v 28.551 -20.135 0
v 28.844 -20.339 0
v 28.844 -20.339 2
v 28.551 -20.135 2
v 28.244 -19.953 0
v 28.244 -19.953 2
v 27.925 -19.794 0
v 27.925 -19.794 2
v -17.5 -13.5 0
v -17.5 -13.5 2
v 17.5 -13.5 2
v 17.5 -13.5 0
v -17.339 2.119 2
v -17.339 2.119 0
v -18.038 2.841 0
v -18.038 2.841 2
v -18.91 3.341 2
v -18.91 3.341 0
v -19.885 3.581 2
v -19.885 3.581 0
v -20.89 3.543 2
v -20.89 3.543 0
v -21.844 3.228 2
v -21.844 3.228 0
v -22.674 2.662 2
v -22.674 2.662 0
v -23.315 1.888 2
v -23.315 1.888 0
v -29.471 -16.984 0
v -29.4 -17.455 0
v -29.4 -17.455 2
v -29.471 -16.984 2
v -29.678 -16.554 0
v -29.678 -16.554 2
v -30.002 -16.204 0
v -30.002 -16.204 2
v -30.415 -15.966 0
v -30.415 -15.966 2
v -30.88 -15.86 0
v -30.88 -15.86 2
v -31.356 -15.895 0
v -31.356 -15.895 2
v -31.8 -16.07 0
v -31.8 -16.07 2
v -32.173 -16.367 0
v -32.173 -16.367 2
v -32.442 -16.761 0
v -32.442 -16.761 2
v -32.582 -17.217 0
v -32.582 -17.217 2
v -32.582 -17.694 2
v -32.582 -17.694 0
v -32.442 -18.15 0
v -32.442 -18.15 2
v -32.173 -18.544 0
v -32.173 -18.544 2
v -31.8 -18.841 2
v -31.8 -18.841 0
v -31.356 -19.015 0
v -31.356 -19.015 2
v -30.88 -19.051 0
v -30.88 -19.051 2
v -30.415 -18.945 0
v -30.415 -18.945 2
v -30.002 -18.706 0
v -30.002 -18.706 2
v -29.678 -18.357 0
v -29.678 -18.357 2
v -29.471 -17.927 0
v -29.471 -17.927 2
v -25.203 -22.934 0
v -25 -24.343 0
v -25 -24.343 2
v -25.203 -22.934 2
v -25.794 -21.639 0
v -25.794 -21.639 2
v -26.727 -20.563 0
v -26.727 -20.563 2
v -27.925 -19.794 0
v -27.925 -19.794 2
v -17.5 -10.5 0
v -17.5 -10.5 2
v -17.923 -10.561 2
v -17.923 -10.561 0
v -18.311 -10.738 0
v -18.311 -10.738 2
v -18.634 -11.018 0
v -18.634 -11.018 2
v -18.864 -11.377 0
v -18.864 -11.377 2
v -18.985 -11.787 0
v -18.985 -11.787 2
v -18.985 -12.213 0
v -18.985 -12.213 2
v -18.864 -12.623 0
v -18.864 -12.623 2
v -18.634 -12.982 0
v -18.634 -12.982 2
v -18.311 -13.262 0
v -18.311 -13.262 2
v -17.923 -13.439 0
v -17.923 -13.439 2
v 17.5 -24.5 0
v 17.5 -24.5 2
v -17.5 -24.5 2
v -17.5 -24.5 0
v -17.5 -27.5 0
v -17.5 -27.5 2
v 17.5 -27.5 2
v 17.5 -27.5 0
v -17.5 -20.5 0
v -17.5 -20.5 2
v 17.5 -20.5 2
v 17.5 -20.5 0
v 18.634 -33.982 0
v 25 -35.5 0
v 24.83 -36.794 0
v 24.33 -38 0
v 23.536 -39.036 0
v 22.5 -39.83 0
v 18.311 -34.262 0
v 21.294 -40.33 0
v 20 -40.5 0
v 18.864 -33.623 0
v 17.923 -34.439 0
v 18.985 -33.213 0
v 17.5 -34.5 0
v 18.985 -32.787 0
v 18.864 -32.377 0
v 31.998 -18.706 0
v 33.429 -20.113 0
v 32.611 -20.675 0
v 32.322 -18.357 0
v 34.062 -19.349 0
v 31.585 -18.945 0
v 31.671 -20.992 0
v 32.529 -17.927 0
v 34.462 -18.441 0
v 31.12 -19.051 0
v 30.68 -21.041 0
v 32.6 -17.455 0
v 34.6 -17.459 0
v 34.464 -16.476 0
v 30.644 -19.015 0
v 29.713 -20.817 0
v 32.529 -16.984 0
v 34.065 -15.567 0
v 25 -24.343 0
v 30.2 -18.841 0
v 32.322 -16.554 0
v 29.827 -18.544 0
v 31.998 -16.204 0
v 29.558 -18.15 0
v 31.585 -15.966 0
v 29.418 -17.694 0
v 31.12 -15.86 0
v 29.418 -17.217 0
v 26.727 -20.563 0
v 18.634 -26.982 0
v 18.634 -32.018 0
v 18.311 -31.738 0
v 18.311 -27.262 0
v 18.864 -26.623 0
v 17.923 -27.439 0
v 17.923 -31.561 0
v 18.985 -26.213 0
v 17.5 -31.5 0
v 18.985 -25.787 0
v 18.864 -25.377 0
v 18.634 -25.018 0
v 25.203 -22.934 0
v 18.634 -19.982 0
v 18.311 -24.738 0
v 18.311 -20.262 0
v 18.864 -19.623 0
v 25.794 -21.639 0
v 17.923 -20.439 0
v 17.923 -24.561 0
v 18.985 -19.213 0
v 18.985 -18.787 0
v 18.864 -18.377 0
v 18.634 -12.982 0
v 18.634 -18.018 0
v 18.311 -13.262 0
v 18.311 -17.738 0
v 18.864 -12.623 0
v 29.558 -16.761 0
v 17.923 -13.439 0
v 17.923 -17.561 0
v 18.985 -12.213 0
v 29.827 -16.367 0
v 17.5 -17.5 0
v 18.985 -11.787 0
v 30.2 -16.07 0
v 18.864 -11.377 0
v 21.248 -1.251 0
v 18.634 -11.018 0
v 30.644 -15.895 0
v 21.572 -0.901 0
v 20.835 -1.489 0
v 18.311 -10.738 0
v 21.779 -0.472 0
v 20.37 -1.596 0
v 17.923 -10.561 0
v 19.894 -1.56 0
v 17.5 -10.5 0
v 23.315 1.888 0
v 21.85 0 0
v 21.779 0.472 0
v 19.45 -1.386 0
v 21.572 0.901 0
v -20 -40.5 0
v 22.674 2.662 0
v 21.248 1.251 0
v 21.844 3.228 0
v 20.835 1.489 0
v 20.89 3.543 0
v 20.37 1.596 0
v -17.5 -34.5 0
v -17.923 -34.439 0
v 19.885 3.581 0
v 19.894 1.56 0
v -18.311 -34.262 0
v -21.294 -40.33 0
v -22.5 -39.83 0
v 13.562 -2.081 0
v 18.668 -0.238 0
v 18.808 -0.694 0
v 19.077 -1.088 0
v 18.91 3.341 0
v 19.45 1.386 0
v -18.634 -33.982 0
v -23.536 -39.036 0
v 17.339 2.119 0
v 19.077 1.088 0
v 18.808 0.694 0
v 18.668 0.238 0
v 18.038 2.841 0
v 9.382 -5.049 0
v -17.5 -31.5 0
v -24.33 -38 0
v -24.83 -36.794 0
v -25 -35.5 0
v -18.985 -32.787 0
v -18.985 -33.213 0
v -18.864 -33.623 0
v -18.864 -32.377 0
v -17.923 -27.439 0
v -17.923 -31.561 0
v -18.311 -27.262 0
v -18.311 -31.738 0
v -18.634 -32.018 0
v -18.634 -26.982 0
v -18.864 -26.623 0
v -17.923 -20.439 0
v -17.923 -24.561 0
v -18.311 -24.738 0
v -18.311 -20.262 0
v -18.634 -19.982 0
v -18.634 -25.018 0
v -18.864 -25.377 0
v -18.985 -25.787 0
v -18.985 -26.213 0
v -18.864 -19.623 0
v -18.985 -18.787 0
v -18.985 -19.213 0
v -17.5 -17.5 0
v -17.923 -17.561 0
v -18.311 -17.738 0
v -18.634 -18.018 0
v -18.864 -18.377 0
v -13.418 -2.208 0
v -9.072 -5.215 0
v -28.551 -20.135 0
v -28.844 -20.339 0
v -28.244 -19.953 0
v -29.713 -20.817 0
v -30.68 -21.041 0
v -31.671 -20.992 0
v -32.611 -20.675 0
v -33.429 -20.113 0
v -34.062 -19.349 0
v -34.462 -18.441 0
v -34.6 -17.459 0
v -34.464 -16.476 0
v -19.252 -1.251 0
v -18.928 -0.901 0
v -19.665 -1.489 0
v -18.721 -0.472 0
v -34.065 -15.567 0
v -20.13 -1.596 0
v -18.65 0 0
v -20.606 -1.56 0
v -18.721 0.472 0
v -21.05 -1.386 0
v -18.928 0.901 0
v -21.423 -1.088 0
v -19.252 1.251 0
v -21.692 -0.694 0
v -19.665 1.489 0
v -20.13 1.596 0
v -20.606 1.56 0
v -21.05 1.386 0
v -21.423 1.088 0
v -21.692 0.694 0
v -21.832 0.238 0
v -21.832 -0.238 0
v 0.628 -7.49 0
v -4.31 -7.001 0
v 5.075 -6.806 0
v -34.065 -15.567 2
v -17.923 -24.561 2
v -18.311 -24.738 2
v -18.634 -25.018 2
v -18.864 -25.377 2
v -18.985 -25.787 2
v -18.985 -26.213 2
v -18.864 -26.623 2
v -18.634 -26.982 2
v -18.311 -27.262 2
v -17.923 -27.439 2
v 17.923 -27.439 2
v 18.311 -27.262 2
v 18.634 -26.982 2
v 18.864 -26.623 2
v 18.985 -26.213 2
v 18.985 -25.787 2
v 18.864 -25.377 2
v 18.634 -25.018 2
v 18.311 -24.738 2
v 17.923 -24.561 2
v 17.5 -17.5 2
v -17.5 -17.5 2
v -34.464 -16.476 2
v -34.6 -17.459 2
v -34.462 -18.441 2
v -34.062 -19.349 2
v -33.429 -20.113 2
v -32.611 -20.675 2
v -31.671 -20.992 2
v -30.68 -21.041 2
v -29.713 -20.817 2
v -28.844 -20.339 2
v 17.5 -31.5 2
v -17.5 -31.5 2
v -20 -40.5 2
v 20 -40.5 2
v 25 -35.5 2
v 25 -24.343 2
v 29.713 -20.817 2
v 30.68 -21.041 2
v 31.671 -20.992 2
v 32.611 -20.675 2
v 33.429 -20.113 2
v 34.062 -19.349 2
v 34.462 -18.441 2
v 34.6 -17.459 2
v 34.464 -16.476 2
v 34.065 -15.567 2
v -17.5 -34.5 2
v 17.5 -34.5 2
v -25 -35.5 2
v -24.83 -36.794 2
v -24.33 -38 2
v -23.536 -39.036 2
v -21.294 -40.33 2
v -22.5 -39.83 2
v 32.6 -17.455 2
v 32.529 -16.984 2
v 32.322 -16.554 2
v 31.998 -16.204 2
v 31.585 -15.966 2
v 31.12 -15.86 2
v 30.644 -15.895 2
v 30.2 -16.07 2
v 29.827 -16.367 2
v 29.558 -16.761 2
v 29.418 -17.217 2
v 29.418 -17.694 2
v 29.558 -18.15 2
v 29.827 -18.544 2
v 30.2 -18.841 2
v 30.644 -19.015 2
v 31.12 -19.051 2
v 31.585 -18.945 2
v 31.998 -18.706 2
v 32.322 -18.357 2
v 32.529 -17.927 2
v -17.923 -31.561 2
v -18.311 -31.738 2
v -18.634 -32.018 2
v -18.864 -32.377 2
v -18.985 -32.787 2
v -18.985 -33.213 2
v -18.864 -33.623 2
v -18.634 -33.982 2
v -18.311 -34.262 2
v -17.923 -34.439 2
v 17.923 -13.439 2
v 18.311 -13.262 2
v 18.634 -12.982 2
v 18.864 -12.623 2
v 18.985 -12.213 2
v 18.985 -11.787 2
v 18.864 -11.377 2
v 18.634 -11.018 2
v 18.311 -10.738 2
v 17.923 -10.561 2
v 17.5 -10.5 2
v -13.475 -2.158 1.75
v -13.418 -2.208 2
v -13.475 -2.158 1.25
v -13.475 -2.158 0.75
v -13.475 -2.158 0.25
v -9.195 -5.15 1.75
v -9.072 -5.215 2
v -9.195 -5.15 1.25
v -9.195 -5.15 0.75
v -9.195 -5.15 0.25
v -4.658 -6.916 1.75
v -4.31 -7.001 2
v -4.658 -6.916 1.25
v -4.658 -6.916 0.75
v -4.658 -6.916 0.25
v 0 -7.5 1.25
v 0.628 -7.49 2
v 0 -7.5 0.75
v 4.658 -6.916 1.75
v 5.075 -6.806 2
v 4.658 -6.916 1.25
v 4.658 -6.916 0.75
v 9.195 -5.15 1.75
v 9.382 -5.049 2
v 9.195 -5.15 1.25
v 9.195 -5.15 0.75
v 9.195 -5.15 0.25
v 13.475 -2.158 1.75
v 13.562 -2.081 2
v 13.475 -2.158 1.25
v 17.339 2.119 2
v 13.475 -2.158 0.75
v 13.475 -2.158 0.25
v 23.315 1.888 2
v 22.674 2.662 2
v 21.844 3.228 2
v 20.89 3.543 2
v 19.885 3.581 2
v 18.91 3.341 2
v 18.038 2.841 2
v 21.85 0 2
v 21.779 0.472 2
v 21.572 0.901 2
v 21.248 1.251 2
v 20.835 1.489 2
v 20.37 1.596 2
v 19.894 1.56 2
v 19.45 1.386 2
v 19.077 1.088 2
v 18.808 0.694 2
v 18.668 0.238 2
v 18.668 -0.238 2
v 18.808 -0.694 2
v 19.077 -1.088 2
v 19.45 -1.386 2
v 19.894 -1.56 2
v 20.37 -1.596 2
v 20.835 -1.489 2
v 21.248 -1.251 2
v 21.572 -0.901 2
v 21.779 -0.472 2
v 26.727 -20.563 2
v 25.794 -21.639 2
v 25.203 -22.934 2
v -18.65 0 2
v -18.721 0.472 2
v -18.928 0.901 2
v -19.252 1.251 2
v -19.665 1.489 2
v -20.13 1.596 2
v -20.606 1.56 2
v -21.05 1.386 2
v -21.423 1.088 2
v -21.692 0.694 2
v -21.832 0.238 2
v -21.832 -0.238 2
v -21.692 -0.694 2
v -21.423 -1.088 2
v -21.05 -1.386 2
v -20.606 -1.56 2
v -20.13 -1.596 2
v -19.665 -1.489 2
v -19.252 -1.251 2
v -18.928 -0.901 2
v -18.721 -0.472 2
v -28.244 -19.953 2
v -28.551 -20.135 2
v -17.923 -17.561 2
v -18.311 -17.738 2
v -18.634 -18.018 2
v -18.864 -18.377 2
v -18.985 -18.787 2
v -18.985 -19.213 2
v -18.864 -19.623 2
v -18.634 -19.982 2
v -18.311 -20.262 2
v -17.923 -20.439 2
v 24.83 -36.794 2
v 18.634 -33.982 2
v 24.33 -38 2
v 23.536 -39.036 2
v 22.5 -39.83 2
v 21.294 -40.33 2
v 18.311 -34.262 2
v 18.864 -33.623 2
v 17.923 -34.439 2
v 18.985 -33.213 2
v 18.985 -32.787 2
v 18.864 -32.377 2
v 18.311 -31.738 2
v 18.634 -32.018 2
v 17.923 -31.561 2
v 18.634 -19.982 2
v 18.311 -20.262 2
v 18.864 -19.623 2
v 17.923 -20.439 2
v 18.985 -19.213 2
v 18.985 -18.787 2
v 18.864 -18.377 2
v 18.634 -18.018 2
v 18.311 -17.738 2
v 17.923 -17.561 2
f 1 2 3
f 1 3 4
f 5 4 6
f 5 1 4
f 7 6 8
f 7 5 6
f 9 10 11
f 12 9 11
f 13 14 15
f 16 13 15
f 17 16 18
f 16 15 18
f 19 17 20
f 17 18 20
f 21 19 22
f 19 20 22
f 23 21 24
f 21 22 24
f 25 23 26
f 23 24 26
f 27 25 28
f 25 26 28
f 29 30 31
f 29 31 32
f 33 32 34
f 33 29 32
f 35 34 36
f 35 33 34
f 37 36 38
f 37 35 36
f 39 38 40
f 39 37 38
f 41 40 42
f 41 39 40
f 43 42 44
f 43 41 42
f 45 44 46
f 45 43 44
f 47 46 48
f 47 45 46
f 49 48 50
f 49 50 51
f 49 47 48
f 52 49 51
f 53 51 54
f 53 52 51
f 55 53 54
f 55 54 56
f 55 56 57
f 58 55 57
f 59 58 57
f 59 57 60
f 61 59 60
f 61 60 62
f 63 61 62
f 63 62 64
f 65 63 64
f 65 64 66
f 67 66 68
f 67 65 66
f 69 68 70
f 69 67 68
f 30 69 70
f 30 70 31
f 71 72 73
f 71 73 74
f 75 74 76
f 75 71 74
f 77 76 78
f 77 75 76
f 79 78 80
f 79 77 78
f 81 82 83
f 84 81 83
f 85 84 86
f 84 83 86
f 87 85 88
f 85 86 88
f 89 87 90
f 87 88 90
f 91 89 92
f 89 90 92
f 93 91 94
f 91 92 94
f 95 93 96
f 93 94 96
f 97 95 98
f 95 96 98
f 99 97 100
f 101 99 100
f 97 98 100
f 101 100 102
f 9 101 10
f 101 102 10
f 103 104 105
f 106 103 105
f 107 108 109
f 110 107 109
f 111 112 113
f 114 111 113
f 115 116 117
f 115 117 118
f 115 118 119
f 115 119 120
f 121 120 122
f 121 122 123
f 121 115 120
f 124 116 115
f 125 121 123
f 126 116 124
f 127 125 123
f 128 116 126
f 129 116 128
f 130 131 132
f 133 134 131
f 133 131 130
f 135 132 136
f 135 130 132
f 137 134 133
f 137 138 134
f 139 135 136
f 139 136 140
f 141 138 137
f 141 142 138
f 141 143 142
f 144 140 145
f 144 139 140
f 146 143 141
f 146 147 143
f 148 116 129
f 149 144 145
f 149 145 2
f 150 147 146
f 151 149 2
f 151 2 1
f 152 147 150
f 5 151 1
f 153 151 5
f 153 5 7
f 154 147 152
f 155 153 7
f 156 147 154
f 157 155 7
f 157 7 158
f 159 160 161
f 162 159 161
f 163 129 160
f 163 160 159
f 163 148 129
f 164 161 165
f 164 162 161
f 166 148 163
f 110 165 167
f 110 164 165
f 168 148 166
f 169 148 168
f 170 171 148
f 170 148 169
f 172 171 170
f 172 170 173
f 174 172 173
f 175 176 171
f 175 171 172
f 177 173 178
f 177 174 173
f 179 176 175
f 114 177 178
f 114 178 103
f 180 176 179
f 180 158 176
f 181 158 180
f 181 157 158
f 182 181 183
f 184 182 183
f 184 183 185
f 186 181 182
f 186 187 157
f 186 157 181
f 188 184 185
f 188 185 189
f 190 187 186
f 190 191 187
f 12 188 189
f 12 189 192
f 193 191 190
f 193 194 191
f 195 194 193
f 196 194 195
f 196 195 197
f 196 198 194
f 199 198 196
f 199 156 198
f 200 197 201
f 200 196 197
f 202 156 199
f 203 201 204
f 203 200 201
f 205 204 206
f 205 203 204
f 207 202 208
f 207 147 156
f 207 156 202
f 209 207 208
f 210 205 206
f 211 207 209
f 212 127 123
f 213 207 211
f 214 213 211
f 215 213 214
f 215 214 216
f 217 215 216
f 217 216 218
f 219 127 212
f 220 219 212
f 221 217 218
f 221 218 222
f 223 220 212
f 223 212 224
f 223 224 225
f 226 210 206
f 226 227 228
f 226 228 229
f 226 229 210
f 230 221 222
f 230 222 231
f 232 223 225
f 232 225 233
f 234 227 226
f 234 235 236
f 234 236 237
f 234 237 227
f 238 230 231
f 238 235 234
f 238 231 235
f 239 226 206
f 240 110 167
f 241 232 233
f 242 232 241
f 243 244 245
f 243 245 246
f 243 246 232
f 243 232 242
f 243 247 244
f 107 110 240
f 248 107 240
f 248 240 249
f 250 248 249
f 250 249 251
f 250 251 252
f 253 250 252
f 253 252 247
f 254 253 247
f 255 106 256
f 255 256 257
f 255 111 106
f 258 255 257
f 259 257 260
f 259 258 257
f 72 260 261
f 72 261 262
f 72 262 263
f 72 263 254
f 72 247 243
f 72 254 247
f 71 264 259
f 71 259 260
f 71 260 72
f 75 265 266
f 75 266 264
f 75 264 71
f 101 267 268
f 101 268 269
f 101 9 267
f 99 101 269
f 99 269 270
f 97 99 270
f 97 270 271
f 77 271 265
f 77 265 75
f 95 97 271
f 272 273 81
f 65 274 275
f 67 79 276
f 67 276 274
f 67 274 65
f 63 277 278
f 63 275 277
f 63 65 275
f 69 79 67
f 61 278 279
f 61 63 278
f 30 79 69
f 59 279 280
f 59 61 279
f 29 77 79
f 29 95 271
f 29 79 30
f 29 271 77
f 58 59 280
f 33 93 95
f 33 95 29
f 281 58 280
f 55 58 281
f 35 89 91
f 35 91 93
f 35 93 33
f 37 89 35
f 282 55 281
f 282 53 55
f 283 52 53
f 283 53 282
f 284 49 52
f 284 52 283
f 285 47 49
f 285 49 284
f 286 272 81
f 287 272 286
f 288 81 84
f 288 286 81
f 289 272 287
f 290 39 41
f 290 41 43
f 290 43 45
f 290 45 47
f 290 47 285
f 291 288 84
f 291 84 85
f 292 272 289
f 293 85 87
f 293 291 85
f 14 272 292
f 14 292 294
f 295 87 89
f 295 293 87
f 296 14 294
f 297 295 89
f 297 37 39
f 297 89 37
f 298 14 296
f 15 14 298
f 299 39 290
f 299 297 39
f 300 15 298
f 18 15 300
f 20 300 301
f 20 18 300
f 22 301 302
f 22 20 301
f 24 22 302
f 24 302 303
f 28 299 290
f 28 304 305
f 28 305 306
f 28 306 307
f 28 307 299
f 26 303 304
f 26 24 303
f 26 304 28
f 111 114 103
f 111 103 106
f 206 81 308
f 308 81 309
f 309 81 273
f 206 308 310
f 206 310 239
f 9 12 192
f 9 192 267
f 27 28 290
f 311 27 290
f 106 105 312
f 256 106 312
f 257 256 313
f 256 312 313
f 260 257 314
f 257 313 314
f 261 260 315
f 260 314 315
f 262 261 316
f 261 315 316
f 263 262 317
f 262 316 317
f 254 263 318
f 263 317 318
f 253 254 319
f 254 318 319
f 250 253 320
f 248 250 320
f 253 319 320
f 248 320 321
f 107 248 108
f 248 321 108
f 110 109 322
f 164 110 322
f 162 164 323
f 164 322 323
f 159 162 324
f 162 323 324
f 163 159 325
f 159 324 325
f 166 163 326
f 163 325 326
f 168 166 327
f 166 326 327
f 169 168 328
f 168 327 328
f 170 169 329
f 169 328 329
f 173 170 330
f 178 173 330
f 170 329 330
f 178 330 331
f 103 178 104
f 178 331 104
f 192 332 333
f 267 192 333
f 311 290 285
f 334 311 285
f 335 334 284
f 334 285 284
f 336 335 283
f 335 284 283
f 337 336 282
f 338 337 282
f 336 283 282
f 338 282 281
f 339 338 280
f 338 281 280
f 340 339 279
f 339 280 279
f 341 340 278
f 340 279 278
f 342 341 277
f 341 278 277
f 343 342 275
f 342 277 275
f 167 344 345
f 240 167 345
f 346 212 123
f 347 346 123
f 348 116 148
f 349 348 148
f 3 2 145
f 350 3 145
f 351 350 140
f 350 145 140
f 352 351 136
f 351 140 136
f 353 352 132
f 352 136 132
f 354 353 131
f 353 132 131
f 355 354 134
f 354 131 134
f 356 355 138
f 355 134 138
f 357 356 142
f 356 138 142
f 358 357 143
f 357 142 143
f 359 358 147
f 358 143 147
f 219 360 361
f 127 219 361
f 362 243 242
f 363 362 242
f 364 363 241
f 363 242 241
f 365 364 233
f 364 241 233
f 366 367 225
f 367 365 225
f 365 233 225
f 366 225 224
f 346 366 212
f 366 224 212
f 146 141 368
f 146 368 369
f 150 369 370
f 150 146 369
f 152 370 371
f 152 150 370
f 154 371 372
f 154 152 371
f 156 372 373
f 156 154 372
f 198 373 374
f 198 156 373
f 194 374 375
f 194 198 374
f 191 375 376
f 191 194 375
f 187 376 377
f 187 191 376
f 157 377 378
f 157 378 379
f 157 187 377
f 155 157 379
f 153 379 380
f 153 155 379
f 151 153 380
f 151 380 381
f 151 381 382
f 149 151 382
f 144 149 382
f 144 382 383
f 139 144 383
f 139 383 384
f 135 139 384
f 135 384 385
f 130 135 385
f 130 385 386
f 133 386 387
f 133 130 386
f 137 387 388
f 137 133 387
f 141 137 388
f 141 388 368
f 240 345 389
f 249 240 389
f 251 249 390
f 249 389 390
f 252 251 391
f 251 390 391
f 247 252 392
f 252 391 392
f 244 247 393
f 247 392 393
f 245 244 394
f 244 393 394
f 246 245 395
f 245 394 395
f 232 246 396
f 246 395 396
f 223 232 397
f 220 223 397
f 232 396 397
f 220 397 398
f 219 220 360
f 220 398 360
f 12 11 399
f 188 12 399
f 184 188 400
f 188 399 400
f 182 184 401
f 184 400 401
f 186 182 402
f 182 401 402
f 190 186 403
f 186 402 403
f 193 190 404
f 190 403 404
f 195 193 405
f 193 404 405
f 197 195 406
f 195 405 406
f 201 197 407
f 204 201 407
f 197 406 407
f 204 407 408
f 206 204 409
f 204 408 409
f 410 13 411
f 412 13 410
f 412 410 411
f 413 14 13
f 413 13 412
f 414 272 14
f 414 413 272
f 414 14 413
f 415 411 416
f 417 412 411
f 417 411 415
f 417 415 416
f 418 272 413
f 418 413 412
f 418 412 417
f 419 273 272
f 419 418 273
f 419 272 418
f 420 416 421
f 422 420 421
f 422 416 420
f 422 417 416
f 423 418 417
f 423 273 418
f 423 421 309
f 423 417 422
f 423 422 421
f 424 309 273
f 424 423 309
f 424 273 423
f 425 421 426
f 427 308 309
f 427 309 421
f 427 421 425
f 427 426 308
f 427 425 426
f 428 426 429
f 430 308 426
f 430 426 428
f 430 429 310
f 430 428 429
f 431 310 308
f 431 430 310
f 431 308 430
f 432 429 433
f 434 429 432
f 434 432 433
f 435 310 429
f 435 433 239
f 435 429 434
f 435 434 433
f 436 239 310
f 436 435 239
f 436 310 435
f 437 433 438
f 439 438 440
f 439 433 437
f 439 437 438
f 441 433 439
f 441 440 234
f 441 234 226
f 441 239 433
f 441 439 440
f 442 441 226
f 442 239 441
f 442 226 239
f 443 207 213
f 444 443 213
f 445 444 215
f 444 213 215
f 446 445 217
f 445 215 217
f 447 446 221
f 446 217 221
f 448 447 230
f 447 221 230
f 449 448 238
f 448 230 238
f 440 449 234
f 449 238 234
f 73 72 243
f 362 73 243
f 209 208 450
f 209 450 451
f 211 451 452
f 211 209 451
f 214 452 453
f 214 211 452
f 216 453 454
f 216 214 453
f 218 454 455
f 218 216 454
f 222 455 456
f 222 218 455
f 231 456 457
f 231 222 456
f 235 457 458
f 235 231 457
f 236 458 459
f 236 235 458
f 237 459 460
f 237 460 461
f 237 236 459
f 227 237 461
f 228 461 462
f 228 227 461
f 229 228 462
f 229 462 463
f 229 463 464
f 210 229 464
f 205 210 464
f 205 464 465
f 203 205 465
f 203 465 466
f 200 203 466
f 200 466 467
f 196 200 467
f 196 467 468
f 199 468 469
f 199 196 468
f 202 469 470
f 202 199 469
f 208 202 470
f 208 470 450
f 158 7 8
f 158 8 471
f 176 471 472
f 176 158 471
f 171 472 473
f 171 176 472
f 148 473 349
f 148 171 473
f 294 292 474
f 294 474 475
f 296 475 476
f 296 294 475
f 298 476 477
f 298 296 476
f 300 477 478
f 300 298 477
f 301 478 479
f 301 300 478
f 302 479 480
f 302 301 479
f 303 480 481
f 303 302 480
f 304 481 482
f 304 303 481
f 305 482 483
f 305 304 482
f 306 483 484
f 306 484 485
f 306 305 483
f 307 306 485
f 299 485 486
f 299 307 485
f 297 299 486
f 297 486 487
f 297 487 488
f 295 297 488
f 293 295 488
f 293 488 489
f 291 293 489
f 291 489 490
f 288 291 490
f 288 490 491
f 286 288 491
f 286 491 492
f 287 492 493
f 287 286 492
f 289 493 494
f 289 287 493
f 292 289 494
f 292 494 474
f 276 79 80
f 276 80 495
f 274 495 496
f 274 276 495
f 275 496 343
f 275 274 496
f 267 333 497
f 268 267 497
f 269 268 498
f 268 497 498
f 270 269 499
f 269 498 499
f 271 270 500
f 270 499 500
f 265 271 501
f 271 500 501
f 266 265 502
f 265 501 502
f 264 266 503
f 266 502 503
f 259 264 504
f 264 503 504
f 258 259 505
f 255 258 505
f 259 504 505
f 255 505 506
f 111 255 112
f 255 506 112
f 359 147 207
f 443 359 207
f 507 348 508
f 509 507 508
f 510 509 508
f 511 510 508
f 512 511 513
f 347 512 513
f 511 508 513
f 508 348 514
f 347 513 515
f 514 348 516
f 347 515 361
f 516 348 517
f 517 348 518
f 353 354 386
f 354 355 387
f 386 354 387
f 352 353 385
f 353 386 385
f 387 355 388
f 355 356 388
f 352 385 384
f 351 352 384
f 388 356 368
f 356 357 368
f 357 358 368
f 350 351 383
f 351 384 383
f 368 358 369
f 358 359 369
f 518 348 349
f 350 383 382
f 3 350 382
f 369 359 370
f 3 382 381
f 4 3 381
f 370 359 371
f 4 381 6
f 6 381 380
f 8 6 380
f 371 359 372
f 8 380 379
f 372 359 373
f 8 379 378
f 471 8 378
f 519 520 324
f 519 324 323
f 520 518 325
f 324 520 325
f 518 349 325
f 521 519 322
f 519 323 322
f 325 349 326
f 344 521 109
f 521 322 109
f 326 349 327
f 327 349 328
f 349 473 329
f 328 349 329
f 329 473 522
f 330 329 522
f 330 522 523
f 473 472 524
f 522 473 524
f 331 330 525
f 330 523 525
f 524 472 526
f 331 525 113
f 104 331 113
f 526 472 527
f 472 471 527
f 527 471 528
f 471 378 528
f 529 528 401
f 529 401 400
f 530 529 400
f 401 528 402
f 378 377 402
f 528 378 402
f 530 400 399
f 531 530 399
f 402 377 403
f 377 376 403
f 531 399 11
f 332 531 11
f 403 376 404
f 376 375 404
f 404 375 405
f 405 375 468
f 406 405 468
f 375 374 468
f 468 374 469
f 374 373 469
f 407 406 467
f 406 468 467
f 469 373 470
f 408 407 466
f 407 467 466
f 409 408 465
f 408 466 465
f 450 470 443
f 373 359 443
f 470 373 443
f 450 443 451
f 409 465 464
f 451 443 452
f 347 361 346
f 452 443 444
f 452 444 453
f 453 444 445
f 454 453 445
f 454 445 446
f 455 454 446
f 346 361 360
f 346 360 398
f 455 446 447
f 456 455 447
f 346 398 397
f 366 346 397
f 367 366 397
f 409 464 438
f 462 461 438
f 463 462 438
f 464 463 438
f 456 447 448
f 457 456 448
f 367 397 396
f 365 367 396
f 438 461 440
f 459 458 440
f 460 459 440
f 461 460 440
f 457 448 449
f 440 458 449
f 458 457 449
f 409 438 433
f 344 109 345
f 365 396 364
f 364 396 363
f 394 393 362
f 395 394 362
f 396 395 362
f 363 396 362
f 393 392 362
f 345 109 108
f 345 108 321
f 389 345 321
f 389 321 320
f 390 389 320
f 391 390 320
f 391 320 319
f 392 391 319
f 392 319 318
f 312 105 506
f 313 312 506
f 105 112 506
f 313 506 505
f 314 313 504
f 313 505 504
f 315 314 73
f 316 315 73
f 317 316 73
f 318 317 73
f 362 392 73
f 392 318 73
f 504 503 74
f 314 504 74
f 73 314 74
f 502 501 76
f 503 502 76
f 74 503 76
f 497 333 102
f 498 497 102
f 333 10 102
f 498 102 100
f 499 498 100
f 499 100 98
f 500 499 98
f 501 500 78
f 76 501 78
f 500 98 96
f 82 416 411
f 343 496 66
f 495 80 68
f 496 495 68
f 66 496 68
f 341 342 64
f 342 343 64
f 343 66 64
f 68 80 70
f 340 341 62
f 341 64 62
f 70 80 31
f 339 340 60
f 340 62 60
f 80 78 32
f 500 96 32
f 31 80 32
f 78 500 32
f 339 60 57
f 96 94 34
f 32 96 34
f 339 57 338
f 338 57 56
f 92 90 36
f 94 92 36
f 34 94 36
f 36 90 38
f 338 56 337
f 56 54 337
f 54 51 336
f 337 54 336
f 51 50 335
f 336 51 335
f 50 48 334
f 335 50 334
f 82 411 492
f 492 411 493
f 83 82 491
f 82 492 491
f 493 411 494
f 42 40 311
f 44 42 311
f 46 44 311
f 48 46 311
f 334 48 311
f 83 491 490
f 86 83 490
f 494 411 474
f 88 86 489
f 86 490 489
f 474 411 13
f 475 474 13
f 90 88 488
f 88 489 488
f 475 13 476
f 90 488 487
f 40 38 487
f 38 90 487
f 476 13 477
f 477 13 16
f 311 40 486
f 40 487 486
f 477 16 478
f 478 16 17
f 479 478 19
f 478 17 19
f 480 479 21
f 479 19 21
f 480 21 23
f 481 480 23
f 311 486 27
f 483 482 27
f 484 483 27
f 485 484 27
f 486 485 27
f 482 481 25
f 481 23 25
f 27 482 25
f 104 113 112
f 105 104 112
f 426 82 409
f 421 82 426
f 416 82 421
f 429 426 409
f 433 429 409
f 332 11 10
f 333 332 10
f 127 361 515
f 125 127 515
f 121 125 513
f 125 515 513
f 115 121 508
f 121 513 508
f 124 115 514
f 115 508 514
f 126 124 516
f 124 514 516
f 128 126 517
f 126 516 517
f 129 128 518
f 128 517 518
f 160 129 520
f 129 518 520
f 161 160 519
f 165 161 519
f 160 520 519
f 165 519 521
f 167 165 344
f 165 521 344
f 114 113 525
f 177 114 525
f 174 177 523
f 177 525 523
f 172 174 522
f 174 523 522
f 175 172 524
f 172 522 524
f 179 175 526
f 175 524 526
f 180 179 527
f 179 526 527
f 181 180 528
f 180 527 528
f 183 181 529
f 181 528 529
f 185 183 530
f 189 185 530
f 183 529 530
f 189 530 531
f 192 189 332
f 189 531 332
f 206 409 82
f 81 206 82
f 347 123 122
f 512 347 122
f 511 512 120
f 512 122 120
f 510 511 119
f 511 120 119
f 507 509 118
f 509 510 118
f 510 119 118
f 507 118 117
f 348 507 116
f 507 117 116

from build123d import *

# Parameters (mm, degrees)
F0_R        = 1.6
F1_DEPTH    = 2
F2_T1_DEPTH = 2
F2_T3_DEPTH = 27
F4_DEPTH    = 25


# Not quite as in the source:
# - a fillet or chamfer that OpenCascade refuses, or shapes differently, is made with other operations: its cross-section is extruded or revolved along the edge and cut away or added


with BuildPart() as f1:
    # F0 (on Top) → F1 (new body)
    with BuildSketch(Plane.XY):
        with BuildLine():
            add(Edge.make_bspline(
                [(-23.1606136078, -2.1185675411), (-22.1073400579, -3.5656171477), (-20.9766129337, -4.8945797394), (-19.7798663886, -6.1017373718)],
                knots=[0, 0, 0, 0, 0.0881031872, 0.0881031872, 0.0881031872, 0.0881031872], degree=3))
            ThreePointArc((-23.1606136078, -2.1185675411), (-23.8473189399, -0.1389116439), (-23.3153209852, 1.887804878))
            Line((-23.3153209852, 1.887804878), (-34.0653209852, -15.5674951767))
            ThreePointArc((-34.0653209852, -15.5674951767), (-32.887804878, -20.5206210399), (-27.9346790148, -19.3431049328))
            Line((-27.9346790148, -19.3431049328), (-19.7798663886, -6.1017373718))
        make_face()
        with Locations((-31, -17.4553000547)):
            Circle(F0_R, mode=Mode.SUBTRACT)
        with BuildLine():
            ThreePointArc((-23.3153209852, 1.887804878), (-23.8473189399, -0.1389116439), (-23.1606136078, -2.1185675411))
            add(Edge.make_bspline(
                [(-23.1606136078, -2.1185675411), (-22.1073400579, -3.5656171477), (-20.9766129337, -4.8945797394), (-19.7798663886, -6.1017373718)],
                knots=[0, 0, 0, 0, 0.0881031872, 0.0881031872, 0.0881031872, 0.0881031872], degree=3))
            Line((-19.7798663886, -6.1017373718), (-17.1846790148, -1.887804878))
            ThreePointArc((-17.1846790148, -1.887804878), (-16.6526810601, 0.1389116439), (-17.3393863922, 2.1185675411))
            ThreePointArc((-17.3393863922, 2.1185675411), (-20.3889116439, 3.5973189399), (-23.3153209852, 1.887804878))
        make_face()
        with Locations((-20.25, 0)):
            Circle(F0_R, mode=Mode.SUBTRACT)
        with BuildLine():
            Line((-17.1846790148, -1.887804878), (-19.7798663886, -6.1017373718))
            add(Edge.make_bspline(
                [(-19.7798663886, -6.1017373718), (-19.2786798287, -6.6072840002), (-17.0287540912, -8.7317983569), (-12.6752714432, -11.7584634521), (-6.4699511651, -14.1622363484), (0, -14.9688818258), (6.4699511651, -14.1622363484), (12.6752714432, -11.7584634521), (17.0287540912, -8.7317983569), (19.2786798287, -6.6072840002), (19.7798663886, -6.1017373718)],
                knots=[0.0881031872, 0.0881031872, 0.0881031872, 0.0881031872, 0.125, 0.25, 0.375, 0.5, 0.625, 0.75, 0.875, 0.9118968128, 0.9118968128, 0.9118968128, 0.9118968128], degree=3))
            Line((19.7798663886, -6.1017373718), (17.1846790148, -1.887804878))
            ThreePointArc((17.1846790148, -1.887804878), (16.6526810601, 0.1389116439), (17.3393863922, 2.1185675411))
            add(Edge.make_bspline(
                [(-17.3393863922, 2.1185675411), (-16.1406178919, 0.4716283513), (-13.5435115335, -2.372660701), (-9.2367539572, -5.3540365479), (-4.6778336966, -7.1127636516), (0, -7.6936181742), (4.6778336966, -7.1127636516), (9.2367539572, -5.3540365479), (13.5435115335, -2.372660701), (16.1406178919, 0.4716283513), (17.3393863922, 2.1185675411)],
                knots=[0, 0, 0, 0, 0.125, 0.25, 0.375, 0.5, 0.625, 0.75, 0.875, 1, 1, 1, 1], degree=3))
            ThreePointArc((-17.3393863922, 2.1185675411), (-16.6526810601, 0.1389116439), (-17.1846790148, -1.887804878))
        make_face()
        with BuildLine():
            add(Edge.make_bspline(
                [(-19.7798663886, -6.1017373718), (-19.2786798287, -6.6072840002), (-17.0287540912, -8.7317983569), (-12.6752714432, -11.7584634521), (-6.4699511651, -14.1622363484), (0, -14.9688818258), (6.4699511651, -14.1622363484), (12.6752714432, -11.7584634521), (17.0287540912, -8.7317983569), (19.2786798287, -6.6072840002), (19.7798663886, -6.1017373718)],
                knots=[0.0881031872, 0.0881031872, 0.0881031872, 0.0881031872, 0.125, 0.25, 0.375, 0.5, 0.625, 0.75, 0.875, 0.9118968128, 0.9118968128, 0.9118968128, 0.9118968128], degree=3))
            Line((-19.7798663886, -6.1017373718), (-27.9346790148, -19.3431049328))
            Line((-27.9346790148, -19.3431049328), (-25, -19.3431049328))
            Line((-25, -19.3431049328), (-25, -40.5))
            Line((-25, -40.5), (0, -40.5))
            Line((0, -40.5), (25, -40.5))
            Line((25, -40.5), (25, -19.3431049328))
            Line((25, -19.3431049328), (27.9346790148, -19.3431049328))
            Line((27.9346790148, -19.3431049328), (19.7798663886, -6.1017373718))
        make_face()
        with BuildLine():
            Line((17.1846790148, -1.887804878), (19.7798663886, -6.1017373718))
            add(Edge.make_bspline(
                [(19.7798663886, -6.1017373718), (20.9766129337, -4.8945797394), (22.1073400579, -3.5656171477), (23.1606136078, -2.1185675411)],
                knots=[0.9118968128, 0.9118968128, 0.9118968128, 0.9118968128, 1, 1, 1, 1], degree=3))
            ThreePointArc((23.1606136078, -2.1185675411), (23.8473189399, -0.1389116439), (23.3153209852, 1.887804878))
            ThreePointArc((23.3153209852, 1.887804878), (20.3889116439, 3.5973189399), (17.3393863922, 2.1185675411))
            ThreePointArc((17.3393863922, 2.1185675411), (16.6526810601, 0.1389116439), (17.1846790148, -1.887804878))
        make_face()
        with Locations((20.25, 0)):
            Circle(F0_R, mode=Mode.SUBTRACT)
        with BuildLine():
            add(Edge.make_bspline(
                [(19.7798663886, -6.1017373718), (20.9766129337, -4.8945797394), (22.1073400579, -3.5656171477), (23.1606136078, -2.1185675411)],
                knots=[0.9118968128, 0.9118968128, 0.9118968128, 0.9118968128, 1, 1, 1, 1], degree=3))
            Line((19.7798663886, -6.1017373718), (27.9346790148, -19.3431049328))
            ThreePointArc((27.9346790148, -19.3431049328), (32.887804878, -20.5206210399), (34.0653209852, -15.5674951767))
            Line((34.0653209852, -15.5674951767), (23.3153209852, 1.887804878))
            ThreePointArc((23.3153209852, 1.887804878), (23.8473189399, -0.1389116439), (23.1606136078, -2.1185675411))
        make_face()
        with Locations((31, -17.4553000547)):
            Circle(F0_R, mode=Mode.SUBTRACT)
    extrude(amount=F1_DEPTH)

    # F2: fillet of radius 5 on 6 edges, made by hand

    # F2_s2 → F2_t1 (join)
    with BuildSketch(Plane.XY):
        with BuildLine():
            ThreePointArc((-25, -24.3431049328), (-26.4644660941, -20.8075710268), (-30, -19.3431049328))
            Line((-30, -19.3431049328), (-25, -19.3431049328))
            Line((-25, -19.3431049328), (-25, -24.3431049328))
        make_face()
        with BuildLine():
            ThreePointArc((-25.8504229337, -19.3431049328), (-27.4279703024, -19.598492799), (-28.8443630885, -20.338567213))
            ThreePointArc((-28.8443630885, -20.338567213), (-28.3424942846, -19.8838105802), (-27.9346790148, -19.3431049328))
            Line((-27.9346790148, -19.3431049328), (-25.8504229337, -19.3431049328))
        make_face()
        with BuildLine():
            ThreePointArc((30, -19.3431049328), (26.4644660941, -20.8075710268), (25, -24.3431049328))
            Line((25, -24.3431049328), (25, -19.3431049328))
            Line((25, -19.3431049328), (30, -19.3431049328))
        make_face()
        with BuildLine():
            ThreePointArc((28.8443630885, -20.338567213), (27.4279703024, -19.598492799), (25.8504229337, -19.3431049328))
            Line((25.8504229337, -19.3431049328), (27.9346790148, -19.3431049328))
            ThreePointArc((27.9346790148, -19.3431049328), (28.3424942846, -19.8838105802), (28.8443630885, -20.338567213))
        make_face()
    extrude(amount=F2_T1_DEPTH)

    # F2_s4 → F2_t3 (cut)
    with BuildSketch(Plane.XY.offset(-12.5)):
        with BuildLine():
            ThreePointArc((-25, -35.5), (-23.5355339059, -39.0355339059), (-20, -40.5))
            Line((-20, -40.5), (-25, -40.5))
            Line((-25, -40.5), (-25, -35.5))
        make_face()
        with BuildLine():
            ThreePointArc((20, -40.5), (23.5355339059, -39.0355339059), (25, -35.5))
            Line((25, -35.5), (25, -40.5))
            Line((25, -40.5), (20, -40.5))
        make_face()
    extrude(amount=F2_T3_DEPTH, mode=Mode.SUBTRACT)

    # F3 (on face) → F4 (cut)
    with BuildSketch(Plane.XY.offset(2)):
        with BuildLine():
            ThreePointArc((-17.5, -10.5), (-19, -12), (-17.5, -13.5))
            Line((-17.5, -13.5), (17.5, -13.5))
            ThreePointArc((17.5, -13.5), (19, -12), (17.5, -10.5))
            Line((17.5, -10.5), (-17.5, -10.5))
        make_face()
        with BuildLine():
            ThreePointArc((-17.5, -17.5), (-19, -19), (-17.5, -20.5))
            Line((-17.5, -20.5), (17.5, -20.5))
            ThreePointArc((17.5, -20.5), (19, -19), (17.5, -17.5))
            Line((17.5, -17.5), (-17.5, -17.5))
        make_face()
        with BuildLine():
            ThreePointArc((-17.5, -24.5), (-19, -26), (-17.5, -27.5))
            Line((-17.5, -27.5), (17.5, -27.5))
            ThreePointArc((17.5, -27.5), (19, -26), (17.5, -24.5))
            Line((17.5, -24.5), (-17.5, -24.5))
        make_face()
        with BuildLine():
            ThreePointArc((-17.5, -31.5), (-19, -33), (-17.5, -34.5))
            Line((-17.5, -34.5), (17.5, -34.5))
            ThreePointArc((17.5, -34.5), (19, -33), (17.5, -31.5))
            Line((17.5, -31.5), (-17.5, -31.5))
        make_face()
    extrude(amount=-F4_DEPTH, mode=Mode.SUBTRACT)


solid = f1.part
